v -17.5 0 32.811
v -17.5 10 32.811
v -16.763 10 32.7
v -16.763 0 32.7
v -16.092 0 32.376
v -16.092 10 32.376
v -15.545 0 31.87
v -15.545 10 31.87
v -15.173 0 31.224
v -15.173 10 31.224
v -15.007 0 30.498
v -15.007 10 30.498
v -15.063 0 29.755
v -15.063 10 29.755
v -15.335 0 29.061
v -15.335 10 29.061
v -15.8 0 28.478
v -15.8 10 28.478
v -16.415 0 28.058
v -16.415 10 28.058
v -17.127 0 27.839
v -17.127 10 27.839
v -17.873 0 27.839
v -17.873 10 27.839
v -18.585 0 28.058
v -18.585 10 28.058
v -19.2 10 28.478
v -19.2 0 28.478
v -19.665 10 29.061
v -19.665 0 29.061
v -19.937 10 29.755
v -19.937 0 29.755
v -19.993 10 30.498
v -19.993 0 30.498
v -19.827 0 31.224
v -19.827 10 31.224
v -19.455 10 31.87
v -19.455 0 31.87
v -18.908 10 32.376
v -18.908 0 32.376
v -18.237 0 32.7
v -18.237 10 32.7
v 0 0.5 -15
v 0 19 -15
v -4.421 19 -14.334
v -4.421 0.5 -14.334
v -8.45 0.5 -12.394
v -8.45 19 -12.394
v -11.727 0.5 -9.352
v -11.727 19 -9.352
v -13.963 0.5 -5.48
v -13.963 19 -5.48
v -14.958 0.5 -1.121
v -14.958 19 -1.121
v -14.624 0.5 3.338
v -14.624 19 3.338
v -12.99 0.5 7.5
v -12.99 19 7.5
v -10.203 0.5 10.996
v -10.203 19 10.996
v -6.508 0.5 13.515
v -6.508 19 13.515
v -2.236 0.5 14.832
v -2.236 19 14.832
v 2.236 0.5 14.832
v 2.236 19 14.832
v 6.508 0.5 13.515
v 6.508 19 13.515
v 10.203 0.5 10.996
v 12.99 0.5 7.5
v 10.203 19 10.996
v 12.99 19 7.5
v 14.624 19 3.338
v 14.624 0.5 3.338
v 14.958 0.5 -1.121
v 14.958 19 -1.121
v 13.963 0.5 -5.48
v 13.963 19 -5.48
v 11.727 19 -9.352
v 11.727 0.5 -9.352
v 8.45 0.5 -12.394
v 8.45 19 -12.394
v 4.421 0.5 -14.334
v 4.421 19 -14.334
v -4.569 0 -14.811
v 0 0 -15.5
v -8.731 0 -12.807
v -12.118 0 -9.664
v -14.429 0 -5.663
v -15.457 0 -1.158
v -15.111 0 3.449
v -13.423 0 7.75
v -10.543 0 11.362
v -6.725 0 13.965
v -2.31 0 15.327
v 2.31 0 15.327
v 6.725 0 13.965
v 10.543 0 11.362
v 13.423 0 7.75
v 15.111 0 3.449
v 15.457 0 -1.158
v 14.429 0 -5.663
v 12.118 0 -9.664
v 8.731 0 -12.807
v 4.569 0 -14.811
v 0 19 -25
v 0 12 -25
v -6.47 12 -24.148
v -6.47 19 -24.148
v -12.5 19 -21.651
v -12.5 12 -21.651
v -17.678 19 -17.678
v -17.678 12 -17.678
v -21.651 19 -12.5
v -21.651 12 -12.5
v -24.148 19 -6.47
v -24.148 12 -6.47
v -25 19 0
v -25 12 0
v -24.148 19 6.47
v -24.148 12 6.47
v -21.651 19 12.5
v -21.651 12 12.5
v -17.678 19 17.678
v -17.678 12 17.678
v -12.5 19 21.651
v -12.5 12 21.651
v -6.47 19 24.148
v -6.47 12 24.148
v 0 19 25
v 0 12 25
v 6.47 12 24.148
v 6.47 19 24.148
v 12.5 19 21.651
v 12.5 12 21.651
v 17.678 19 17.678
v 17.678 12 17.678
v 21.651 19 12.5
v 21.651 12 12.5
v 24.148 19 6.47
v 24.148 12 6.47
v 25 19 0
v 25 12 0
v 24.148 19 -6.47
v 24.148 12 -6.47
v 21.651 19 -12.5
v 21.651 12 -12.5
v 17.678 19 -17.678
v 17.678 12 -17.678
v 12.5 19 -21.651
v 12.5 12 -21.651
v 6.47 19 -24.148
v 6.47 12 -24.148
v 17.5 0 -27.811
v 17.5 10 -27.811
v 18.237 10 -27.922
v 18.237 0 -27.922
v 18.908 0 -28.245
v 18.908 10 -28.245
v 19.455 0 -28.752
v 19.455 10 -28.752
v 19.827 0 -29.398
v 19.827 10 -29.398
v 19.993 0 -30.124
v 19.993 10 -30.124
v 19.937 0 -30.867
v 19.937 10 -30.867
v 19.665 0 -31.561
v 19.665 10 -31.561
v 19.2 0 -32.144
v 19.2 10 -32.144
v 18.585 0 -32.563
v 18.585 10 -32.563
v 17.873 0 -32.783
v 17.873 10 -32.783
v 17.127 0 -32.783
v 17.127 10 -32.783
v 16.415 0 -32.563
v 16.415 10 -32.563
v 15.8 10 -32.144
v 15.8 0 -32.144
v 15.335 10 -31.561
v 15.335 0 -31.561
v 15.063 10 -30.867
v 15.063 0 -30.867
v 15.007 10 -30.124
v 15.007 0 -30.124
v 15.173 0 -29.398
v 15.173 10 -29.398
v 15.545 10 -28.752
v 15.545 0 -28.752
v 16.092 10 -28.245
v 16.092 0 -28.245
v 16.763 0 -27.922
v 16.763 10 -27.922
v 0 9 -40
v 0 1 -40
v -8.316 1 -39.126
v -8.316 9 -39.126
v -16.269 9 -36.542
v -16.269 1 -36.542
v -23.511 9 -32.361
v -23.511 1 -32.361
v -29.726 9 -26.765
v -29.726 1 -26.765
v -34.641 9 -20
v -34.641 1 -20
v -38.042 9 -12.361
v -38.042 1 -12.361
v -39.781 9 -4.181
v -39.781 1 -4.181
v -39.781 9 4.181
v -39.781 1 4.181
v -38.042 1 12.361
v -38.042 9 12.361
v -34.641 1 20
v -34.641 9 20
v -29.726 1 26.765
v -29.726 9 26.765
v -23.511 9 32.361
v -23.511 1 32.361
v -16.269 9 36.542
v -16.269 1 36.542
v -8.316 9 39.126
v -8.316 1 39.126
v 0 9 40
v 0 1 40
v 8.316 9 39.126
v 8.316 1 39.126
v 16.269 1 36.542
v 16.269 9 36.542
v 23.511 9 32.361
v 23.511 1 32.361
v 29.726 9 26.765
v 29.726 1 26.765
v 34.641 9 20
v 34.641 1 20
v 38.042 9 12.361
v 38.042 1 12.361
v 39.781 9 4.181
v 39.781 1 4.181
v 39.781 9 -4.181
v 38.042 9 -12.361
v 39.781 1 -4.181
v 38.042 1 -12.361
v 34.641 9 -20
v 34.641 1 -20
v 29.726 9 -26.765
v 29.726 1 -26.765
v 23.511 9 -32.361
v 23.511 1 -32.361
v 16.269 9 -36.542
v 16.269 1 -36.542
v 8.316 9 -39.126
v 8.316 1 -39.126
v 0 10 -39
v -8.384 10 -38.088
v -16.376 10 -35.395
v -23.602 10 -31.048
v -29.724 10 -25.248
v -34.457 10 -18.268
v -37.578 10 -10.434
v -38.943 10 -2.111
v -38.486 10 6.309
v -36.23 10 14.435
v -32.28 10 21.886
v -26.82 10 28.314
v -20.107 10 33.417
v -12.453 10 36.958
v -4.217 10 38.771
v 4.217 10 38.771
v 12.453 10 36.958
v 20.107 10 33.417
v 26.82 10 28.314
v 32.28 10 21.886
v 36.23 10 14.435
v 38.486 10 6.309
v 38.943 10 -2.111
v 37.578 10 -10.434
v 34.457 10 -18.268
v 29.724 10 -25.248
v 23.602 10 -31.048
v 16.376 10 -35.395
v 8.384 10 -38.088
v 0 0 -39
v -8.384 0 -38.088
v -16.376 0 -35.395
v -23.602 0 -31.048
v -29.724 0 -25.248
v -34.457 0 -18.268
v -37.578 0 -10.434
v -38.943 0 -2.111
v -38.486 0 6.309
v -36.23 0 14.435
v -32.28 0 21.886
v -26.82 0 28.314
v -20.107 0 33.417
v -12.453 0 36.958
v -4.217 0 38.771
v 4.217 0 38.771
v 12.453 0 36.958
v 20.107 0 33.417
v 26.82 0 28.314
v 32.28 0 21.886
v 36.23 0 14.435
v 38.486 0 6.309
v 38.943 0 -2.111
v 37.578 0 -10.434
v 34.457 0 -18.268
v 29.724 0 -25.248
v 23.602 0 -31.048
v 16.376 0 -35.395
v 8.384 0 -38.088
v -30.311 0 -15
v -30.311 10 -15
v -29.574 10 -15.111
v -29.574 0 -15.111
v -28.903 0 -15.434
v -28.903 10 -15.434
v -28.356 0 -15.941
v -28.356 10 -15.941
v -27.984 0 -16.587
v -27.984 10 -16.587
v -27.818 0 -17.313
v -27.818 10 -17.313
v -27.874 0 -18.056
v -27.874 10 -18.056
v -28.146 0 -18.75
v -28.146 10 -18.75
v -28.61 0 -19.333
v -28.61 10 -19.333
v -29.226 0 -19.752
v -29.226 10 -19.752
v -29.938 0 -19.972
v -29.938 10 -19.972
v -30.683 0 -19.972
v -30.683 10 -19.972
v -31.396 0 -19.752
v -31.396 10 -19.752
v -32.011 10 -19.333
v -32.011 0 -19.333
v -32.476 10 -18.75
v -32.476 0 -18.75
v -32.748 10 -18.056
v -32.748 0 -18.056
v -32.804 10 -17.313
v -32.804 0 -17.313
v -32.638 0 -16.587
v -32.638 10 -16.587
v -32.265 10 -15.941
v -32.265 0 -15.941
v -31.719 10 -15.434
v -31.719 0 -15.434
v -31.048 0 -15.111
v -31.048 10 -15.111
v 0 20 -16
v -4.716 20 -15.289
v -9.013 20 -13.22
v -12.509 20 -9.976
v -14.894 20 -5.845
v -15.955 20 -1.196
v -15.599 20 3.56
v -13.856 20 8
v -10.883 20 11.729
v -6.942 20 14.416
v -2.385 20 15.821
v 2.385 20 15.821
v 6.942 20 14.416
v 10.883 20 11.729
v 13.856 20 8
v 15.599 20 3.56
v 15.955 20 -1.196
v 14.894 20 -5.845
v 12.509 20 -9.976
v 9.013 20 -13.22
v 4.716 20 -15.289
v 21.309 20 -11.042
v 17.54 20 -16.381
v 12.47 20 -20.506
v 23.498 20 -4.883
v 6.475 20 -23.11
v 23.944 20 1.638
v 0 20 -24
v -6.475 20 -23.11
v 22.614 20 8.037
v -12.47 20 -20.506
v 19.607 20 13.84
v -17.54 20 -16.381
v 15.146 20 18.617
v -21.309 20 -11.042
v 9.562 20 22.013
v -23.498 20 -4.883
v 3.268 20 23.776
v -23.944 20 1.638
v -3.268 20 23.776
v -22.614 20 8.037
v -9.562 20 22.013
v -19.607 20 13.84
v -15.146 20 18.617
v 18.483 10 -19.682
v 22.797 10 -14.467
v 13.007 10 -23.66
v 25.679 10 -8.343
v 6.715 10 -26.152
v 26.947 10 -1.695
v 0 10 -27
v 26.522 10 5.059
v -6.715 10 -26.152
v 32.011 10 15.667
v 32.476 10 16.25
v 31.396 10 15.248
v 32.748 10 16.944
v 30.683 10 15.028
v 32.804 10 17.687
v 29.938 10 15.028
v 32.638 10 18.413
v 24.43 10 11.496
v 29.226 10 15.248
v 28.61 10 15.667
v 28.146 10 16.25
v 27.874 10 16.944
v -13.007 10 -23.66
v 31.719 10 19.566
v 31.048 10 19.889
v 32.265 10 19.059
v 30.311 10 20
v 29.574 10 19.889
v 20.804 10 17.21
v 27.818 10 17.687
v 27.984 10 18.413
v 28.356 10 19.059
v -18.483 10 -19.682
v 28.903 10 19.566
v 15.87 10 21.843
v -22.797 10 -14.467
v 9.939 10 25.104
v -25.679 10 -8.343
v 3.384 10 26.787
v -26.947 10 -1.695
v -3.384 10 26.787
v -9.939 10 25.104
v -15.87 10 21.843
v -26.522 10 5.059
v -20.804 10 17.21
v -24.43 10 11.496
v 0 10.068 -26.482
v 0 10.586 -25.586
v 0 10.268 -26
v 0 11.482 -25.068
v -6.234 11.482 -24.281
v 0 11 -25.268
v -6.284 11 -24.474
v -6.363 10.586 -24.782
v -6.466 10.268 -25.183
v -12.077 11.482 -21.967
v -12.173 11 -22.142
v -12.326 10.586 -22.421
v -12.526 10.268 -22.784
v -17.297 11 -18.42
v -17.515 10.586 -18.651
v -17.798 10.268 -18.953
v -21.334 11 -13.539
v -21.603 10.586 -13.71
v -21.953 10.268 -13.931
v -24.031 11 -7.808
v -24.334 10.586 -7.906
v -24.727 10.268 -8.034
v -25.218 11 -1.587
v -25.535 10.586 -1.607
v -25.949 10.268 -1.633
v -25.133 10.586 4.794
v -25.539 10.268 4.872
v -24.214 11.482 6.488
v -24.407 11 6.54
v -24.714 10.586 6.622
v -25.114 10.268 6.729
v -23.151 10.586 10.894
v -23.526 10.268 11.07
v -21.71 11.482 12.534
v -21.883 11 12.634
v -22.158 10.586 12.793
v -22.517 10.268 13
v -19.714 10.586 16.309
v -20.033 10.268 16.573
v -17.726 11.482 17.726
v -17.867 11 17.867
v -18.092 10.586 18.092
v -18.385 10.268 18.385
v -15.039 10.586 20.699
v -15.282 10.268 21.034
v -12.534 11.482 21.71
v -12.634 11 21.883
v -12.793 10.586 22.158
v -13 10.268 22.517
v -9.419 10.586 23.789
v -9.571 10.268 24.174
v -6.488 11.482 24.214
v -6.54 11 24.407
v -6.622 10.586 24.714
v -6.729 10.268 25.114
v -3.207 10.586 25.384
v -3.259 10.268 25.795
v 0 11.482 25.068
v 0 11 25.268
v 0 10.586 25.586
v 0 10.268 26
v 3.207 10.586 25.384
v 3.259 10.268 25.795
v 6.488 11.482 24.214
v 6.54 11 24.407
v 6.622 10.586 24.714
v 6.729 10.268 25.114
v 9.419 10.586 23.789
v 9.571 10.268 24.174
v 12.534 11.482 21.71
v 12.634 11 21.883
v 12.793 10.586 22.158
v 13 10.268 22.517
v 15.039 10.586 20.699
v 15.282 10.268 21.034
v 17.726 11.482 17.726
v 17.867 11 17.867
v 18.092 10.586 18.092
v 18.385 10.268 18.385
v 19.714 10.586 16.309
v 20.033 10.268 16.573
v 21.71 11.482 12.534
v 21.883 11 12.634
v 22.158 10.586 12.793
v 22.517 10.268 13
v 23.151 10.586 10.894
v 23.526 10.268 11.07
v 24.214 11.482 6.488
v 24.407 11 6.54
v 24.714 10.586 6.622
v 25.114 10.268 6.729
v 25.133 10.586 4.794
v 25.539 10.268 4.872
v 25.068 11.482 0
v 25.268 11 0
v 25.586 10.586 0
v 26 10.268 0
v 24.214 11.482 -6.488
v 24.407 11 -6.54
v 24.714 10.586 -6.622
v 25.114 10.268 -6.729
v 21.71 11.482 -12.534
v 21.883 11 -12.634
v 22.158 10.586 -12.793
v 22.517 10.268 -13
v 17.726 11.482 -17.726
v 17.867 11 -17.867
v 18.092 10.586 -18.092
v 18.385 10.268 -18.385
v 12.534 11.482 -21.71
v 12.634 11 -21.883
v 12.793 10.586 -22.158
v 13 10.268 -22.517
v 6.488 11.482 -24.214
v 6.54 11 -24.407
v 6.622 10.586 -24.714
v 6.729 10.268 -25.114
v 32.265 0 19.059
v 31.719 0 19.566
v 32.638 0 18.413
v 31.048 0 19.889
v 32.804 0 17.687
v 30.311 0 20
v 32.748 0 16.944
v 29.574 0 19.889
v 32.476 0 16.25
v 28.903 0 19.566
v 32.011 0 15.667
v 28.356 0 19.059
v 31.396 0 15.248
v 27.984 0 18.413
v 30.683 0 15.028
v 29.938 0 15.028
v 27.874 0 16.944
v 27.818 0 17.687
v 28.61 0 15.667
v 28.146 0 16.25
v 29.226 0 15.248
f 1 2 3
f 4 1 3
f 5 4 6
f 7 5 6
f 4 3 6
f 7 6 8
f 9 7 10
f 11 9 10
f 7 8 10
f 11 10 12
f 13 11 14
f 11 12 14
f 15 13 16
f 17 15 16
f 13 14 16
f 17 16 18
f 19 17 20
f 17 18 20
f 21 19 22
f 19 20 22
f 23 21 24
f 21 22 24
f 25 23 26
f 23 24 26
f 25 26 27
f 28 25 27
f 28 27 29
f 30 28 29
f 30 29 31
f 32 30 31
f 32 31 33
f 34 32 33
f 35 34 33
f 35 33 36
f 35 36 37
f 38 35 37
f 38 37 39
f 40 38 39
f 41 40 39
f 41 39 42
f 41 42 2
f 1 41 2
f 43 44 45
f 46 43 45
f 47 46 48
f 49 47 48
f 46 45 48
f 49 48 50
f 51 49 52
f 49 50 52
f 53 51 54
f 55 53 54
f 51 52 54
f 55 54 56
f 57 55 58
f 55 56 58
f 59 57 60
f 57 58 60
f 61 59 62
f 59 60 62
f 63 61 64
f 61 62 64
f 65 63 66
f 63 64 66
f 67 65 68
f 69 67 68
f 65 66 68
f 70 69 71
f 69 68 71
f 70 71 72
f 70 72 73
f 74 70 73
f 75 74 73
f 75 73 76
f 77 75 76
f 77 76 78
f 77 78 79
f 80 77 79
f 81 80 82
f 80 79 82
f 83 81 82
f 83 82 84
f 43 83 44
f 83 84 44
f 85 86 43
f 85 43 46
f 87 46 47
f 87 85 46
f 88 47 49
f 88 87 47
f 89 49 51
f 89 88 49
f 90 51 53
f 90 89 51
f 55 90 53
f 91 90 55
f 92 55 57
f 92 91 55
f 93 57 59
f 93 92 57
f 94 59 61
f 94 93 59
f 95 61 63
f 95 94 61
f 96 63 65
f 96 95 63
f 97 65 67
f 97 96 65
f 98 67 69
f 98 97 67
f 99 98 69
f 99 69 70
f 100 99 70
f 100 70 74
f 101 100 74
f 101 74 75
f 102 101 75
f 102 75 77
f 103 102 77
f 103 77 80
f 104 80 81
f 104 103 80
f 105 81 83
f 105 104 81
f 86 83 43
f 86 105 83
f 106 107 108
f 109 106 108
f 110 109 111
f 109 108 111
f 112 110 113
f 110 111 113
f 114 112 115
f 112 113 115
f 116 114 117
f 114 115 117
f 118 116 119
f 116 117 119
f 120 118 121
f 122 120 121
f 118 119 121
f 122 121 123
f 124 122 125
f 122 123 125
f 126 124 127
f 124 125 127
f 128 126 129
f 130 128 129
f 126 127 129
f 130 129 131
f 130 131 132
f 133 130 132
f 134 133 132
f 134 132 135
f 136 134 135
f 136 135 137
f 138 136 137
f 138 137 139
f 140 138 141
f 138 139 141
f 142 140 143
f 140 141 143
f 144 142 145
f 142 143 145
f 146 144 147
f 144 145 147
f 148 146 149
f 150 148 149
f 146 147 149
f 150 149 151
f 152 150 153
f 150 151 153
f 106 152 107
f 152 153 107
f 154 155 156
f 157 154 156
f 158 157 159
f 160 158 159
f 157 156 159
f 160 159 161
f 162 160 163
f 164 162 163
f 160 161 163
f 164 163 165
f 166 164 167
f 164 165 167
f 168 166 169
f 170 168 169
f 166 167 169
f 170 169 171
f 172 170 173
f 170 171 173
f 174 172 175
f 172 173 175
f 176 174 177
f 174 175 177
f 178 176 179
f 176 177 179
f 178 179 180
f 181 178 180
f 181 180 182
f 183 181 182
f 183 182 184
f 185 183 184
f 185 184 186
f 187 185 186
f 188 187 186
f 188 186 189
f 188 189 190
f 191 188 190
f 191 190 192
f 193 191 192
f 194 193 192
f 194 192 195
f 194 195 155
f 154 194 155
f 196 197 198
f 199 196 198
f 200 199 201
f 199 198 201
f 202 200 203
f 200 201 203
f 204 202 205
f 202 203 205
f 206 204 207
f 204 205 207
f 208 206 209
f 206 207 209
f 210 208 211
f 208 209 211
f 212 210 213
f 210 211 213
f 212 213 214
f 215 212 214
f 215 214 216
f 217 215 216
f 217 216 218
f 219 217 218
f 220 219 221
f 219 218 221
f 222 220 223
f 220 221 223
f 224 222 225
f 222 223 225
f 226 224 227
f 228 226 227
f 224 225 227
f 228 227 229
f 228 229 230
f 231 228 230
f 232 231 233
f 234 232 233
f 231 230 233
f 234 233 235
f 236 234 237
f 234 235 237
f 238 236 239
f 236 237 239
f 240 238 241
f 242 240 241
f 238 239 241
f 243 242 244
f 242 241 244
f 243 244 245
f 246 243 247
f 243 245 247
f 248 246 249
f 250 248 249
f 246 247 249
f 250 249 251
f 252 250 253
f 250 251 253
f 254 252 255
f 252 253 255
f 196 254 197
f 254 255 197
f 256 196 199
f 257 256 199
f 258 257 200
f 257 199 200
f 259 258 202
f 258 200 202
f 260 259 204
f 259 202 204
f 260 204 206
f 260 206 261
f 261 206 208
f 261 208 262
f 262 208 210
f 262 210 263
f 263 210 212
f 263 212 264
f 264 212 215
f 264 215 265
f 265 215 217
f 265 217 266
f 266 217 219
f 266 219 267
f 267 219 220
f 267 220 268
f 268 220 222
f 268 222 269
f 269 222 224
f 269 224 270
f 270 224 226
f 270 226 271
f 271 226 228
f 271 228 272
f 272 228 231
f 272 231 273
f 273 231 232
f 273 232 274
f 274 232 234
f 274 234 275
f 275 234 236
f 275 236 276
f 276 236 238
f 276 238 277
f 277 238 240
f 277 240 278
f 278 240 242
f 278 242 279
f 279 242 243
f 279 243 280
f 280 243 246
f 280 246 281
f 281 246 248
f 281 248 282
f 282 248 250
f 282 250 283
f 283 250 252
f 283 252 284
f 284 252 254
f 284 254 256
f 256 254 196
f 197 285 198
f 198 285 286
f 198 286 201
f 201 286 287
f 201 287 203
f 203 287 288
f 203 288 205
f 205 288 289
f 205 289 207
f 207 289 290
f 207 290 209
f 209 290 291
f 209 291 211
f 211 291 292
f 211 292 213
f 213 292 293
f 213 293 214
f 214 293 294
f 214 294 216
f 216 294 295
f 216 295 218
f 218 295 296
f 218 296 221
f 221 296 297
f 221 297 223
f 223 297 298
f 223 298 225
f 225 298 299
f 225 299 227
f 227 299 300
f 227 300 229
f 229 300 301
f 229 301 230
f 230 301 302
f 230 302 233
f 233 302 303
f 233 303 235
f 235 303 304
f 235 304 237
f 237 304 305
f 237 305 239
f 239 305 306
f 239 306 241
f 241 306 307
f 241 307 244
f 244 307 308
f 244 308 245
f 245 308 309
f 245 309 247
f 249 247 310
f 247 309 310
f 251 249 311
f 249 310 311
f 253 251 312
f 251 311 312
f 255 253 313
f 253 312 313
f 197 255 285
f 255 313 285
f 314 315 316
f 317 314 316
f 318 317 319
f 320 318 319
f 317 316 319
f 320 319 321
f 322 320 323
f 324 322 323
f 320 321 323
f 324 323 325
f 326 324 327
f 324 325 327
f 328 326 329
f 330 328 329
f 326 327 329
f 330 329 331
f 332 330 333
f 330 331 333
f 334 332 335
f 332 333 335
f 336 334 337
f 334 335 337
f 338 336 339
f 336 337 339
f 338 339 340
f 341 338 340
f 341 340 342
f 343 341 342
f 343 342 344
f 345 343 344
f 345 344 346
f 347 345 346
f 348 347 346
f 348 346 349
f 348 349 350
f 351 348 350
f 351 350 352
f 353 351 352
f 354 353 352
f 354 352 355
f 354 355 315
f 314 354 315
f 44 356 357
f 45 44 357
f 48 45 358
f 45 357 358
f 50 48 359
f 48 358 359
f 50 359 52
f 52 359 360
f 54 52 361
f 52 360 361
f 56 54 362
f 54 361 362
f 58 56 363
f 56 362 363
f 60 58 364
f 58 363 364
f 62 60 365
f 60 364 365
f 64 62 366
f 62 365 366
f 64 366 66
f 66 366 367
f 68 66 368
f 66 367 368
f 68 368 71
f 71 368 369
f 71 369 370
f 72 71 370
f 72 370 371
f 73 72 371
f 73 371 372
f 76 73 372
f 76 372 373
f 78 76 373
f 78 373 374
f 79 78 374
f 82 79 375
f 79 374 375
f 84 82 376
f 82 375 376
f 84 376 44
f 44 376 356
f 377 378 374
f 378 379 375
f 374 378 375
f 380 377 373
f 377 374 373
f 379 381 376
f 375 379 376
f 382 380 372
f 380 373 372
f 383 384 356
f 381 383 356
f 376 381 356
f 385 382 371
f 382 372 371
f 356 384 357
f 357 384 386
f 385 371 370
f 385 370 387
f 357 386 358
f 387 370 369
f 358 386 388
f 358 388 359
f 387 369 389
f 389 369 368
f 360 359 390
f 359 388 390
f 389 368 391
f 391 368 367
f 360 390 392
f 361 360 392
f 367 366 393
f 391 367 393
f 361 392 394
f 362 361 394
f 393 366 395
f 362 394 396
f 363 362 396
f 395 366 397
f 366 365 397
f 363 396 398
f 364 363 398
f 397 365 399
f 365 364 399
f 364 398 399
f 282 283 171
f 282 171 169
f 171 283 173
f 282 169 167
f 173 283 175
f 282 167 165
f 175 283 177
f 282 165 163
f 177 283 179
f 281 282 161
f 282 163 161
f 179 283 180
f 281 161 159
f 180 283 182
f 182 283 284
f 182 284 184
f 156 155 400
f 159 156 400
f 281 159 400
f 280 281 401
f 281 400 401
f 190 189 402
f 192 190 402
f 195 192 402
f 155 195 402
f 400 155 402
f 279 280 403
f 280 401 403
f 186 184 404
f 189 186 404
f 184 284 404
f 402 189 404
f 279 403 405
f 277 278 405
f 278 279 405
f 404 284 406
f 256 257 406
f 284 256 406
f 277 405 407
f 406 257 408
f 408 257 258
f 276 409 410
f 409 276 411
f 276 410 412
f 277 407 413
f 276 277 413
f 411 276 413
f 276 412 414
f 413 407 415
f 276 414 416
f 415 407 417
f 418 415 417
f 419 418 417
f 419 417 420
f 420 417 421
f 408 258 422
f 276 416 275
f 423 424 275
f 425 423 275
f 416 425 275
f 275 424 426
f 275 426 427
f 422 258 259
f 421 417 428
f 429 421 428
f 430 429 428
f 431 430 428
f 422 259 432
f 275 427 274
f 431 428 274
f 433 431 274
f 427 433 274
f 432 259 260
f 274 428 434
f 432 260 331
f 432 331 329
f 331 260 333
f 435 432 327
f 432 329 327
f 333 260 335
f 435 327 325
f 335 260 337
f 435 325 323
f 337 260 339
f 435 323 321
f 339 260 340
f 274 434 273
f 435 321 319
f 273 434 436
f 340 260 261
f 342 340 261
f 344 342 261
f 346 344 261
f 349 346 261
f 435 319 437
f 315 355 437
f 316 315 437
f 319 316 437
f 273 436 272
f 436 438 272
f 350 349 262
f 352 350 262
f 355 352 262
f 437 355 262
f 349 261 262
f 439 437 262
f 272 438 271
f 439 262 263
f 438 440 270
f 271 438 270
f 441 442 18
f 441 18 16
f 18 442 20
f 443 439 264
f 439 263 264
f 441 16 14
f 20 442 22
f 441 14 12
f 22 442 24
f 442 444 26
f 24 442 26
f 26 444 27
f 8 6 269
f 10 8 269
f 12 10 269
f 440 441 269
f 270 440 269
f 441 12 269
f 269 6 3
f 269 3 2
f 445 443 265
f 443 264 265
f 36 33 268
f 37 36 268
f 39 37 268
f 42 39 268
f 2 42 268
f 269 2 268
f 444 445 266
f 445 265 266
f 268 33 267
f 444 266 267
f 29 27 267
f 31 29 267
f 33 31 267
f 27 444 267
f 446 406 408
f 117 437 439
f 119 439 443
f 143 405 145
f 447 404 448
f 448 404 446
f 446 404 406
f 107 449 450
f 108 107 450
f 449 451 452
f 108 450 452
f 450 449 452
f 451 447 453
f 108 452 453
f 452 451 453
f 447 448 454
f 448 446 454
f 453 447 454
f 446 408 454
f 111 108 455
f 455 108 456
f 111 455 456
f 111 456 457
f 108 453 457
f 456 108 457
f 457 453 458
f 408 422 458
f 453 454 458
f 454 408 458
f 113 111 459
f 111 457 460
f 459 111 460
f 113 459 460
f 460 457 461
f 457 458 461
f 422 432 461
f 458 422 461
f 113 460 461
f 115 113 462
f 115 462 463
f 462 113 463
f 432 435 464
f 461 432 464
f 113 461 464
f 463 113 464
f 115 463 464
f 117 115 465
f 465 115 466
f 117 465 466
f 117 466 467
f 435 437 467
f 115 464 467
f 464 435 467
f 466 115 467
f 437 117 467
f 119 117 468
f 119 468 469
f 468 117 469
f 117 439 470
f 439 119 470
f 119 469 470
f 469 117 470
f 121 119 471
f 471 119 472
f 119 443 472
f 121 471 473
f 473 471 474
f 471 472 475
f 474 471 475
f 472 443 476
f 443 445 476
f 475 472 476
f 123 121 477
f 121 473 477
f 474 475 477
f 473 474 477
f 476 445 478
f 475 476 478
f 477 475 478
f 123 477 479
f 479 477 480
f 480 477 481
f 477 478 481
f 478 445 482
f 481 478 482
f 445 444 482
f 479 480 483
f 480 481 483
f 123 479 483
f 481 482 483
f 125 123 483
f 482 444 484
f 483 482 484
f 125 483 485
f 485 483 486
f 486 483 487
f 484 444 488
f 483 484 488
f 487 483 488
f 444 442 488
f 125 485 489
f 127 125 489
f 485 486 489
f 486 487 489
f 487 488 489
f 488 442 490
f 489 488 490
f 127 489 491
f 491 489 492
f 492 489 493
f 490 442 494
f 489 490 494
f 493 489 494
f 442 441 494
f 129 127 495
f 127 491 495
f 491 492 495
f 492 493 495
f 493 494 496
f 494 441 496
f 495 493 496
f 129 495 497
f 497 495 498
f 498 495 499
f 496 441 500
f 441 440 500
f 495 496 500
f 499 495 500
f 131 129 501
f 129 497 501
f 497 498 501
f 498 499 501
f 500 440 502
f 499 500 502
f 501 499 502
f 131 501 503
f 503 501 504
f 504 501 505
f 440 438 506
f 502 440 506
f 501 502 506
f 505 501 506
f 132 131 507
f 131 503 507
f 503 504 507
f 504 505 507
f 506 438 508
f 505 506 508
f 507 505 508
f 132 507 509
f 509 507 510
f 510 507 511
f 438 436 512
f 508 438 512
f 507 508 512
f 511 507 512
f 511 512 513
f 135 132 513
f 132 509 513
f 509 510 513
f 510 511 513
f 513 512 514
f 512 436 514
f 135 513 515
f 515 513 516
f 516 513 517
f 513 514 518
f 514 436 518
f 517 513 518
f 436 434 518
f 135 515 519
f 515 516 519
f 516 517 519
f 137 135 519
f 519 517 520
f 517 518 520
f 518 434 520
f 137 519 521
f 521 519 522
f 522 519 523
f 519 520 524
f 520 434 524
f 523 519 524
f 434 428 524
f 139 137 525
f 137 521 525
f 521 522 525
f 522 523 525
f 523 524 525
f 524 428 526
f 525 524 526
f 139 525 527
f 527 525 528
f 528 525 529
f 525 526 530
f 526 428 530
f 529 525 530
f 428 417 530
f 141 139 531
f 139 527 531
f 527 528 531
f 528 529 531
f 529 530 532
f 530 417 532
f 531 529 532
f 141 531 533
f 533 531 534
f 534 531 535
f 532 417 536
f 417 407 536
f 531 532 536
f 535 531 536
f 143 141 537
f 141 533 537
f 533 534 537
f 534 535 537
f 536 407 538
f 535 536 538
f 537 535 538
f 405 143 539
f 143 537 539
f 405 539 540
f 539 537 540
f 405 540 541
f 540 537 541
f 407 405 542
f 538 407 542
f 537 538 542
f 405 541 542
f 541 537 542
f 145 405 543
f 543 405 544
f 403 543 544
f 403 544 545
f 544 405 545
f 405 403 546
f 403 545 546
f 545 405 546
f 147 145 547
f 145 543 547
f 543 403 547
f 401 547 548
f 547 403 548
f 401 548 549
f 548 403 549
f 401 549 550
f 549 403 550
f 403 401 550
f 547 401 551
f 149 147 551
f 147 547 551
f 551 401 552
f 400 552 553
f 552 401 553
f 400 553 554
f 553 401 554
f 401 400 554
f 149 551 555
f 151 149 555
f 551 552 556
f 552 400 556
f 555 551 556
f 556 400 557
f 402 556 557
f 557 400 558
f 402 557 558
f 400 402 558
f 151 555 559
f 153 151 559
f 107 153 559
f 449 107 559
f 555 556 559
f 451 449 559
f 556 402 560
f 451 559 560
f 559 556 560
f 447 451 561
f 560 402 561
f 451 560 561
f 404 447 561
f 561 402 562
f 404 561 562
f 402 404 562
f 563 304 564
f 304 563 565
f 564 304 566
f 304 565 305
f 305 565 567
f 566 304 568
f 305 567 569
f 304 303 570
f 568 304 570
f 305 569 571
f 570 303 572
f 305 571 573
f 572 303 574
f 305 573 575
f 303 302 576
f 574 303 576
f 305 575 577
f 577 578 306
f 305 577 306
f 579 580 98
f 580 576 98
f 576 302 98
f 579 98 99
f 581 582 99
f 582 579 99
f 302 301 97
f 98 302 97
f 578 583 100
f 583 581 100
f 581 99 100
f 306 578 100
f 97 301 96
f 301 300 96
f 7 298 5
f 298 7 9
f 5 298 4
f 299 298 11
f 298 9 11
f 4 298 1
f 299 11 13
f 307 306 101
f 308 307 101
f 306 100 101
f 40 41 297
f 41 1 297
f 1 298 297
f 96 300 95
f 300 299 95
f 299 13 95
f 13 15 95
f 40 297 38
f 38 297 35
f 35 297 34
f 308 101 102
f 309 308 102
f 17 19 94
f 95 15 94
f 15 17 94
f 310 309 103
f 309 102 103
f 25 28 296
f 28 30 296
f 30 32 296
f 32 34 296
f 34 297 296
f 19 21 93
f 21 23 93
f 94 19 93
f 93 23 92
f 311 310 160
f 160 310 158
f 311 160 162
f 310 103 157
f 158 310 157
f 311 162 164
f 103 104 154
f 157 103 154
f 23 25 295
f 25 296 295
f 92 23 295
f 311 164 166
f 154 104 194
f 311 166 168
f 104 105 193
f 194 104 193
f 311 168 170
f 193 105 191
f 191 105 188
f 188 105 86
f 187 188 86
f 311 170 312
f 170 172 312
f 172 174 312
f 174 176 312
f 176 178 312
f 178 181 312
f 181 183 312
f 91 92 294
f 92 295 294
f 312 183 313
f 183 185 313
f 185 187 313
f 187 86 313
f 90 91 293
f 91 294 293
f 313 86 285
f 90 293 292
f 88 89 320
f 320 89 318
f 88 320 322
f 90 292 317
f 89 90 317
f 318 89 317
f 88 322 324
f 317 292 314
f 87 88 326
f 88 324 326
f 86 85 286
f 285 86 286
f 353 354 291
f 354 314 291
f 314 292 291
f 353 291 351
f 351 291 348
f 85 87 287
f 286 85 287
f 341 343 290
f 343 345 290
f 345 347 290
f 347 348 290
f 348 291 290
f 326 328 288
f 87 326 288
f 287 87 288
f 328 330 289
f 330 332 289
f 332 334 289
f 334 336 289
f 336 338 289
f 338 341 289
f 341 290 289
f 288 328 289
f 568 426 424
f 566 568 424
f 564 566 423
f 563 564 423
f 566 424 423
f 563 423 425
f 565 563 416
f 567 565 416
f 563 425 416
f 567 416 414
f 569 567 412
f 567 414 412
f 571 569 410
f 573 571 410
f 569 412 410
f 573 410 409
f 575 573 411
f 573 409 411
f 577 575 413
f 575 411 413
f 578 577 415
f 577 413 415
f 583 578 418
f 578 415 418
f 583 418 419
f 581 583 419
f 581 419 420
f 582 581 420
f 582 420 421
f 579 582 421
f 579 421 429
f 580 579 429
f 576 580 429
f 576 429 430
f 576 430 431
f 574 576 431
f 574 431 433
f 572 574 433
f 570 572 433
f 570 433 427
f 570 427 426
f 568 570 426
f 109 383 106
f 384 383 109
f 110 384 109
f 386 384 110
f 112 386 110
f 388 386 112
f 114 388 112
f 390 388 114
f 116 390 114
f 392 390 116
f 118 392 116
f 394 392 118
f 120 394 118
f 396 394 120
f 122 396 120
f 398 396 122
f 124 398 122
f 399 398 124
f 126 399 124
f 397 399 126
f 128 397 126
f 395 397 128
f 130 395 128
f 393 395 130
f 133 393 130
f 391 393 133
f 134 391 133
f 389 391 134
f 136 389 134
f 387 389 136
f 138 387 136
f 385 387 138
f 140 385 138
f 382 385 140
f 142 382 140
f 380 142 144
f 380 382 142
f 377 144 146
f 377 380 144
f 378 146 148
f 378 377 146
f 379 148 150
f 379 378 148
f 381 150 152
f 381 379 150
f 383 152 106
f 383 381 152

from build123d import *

# Parameters (mm, degrees)
CHAMFER1_SIZE      = 1
CUT_EXTRUDE1_REACH = 59.446
SKETCH3_R          = 2.5
FILLET1_R          = 2
CHAMFER2_SIZE      = 1
CHAMFER3_SIZE      = 0.5


with BuildPart() as part:
    # Sketch1 → Revolve1 (revolve)
    with BuildSketch(Plane.XY, mode=Mode.PRIVATE) as revolve1_sk:
        Polygon((-15, 0), (-15, 20), (-25, 20), (-25, 10), (-40, 10), (-40, 0), align=None)
    revolve(revolve1_sk.sketch.rotate(Axis((0, 0, 0), (0, 1, 0)), 270), axis=Axis((0, 0, 0), (0, 1, 0)))

    # Chamfer1
    chamfer1_edges = [part.edges().sort_by_distance(p)[0] for p in [
        (0, 20, 15),
    ]]
    chamfer(chamfer1_edges, length=CHAMFER1_SIZE)

    # Sketch3 → Cut-Extrude1 (cut, up to next)
    with BuildSketch(Plane(origin=(0, 10, 0), x_dir=(1, 0, 0), z_dir=(0, 1, 0)), mode=Mode.PRIVATE) as cut_extrude1_sk1:
        with Locations(Location((17.5, 30.310889132, 0), (0, 0, 270))):
            Circle(SKETCH3_R)
    cut_extrude1_tool1 = extrude(cut_extrude1_sk1.sketch, amount=-CUT_EXTRUDE1_REACH, mode=Mode.PRIVATE) & part.part
    # Sketch3 → Cut-Extrude1 (cut, up to next)
    with BuildSketch(Plane(origin=(0, 10, 0), x_dir=(1, 0, 0), z_dir=(0, 1, 0)), mode=Mode.PRIVATE) as cut_extrude1_sk2:
        with Locations(Location((30.310889132, -17.5, 0), (0, 0, 270))):
            Circle(SKETCH3_R)
    cut_extrude1_tool2 = extrude(cut_extrude1_sk2.sketch, amount=-CUT_EXTRUDE1_REACH, mode=Mode.PRIVATE) & part.part
    # Sketch3 → Cut-Extrude1 (cut, up to next)
    with BuildSketch(Plane(origin=(0, 10, 0), x_dir=(1, 0, 0), z_dir=(0, 1, 0)), mode=Mode.PRIVATE) as cut_extrude1_sk3:
        with Locations(Location((-17.5, -30.310889132, 0), (0, 0, 270))):
            Circle(SKETCH3_R)
    cut_extrude1_tool3 = extrude(cut_extrude1_sk3.sketch, amount=-CUT_EXTRUDE1_REACH, mode=Mode.PRIVATE) & part.part
    # Sketch3 → Cut-Extrude1 (cut, up to next)
    with BuildSketch(Plane(origin=(0, 10, 0), x_dir=(1, 0, 0), z_dir=(0, 1, 0)), mode=Mode.PRIVATE) as cut_extrude1_sk4:
        with Locations(Location((-30.310889132, 17.5, 0), (0, 0, 270))):
            Circle(SKETCH3_R)
    cut_extrude1_tool4 = extrude(cut_extrude1_sk4.sketch, amount=-CUT_EXTRUDE1_REACH, mode=Mode.PRIVATE) & part.part
    add(cut_extrude1_tool1.solids().sort_by_distance((17.5, 10, -30.310889))[0], mode=Mode.SUBTRACT)
    add(cut_extrude1_tool2.solids().sort_by_distance((30.310889, 10, 17.5))[0], mode=Mode.SUBTRACT)
    add(cut_extrude1_tool3.solids().sort_by_distance((-17.5, 10, 30.310889))[0], mode=Mode.SUBTRACT)
    add(cut_extrude1_tool4.solids().sort_by_distance((-30.310889, 10, -17.5))[0], mode=Mode.SUBTRACT)

    # Fillet1
    fillet1_edges = [part.edges().sort_by_distance(p)[0] for p in [
        (0, 10, 25),
    ]]
    fillet(fillet1_edges, radius=FILLET1_R)

    # Chamfer2
    chamfer2_edges = [part.edges().sort_by_distance(p)[0] for p in [
        (0, 0, 40),
        (0, 10, 40),
        (0, 20, 25),
    ]]
    chamfer(chamfer2_edges, length=CHAMFER2_SIZE)

    # Chamfer3
    chamfer3_edges = [part.edges().sort_by_distance(p)[0] for p in [
        (0, 0, 15),
    ]]
    chamfer(chamfer3_edges, length=CHAMFER3_SIZE)


solid = part.part
